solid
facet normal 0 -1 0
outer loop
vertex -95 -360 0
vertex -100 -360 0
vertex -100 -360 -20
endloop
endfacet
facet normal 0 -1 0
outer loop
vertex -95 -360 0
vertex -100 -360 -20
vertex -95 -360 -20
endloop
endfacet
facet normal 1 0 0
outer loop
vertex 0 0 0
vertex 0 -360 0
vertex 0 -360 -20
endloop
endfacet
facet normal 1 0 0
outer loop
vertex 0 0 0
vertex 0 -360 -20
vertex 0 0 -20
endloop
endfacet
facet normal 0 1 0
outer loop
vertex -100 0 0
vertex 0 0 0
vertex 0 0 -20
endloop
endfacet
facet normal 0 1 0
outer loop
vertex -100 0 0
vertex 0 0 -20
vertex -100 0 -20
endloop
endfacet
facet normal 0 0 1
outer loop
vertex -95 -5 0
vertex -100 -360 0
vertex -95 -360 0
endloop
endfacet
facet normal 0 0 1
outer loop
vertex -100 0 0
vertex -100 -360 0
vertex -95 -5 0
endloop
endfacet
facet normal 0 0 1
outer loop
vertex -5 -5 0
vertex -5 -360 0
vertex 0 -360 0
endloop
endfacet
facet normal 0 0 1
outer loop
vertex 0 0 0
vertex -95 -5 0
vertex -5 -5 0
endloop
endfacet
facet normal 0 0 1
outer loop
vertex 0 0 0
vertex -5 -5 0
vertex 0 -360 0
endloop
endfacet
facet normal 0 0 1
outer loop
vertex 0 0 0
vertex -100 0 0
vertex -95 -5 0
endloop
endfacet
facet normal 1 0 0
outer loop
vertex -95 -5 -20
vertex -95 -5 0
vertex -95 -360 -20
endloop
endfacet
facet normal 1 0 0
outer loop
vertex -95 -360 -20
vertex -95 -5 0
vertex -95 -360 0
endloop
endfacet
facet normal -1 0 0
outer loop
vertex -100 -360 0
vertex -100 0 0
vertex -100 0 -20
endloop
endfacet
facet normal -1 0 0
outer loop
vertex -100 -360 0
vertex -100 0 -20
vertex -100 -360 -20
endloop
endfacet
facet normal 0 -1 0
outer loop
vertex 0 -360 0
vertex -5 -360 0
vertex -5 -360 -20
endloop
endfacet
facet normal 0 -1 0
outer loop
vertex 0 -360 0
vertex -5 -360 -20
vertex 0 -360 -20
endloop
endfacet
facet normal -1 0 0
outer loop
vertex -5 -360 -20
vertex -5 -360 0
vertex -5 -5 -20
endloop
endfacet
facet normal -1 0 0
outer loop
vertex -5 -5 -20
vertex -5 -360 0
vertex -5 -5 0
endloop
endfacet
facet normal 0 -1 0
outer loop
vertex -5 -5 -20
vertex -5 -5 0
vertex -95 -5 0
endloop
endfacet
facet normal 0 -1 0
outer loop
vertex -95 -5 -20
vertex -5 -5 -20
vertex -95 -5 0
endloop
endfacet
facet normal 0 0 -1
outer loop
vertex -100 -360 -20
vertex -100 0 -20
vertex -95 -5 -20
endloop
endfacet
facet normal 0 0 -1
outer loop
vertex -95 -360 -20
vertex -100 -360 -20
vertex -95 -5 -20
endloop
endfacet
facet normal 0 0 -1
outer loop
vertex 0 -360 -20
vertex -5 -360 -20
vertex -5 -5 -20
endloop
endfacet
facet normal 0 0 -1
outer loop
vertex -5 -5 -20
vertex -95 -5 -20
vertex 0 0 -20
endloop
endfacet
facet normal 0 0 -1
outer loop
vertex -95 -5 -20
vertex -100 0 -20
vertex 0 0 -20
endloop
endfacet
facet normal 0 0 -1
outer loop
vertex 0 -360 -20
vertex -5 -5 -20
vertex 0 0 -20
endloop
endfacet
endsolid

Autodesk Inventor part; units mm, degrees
ref_plane "YZ Plane" through (0, 0, 0) normal (1, 0, 0) x (0, 1, 0)
ref_plane "XZ Plane" through (0, 0, 0) normal (0, 1, 0) x (-1, 0, 0)
sketch "スケッチ1" plane through (0, 0, 0) normal (0, 0, 1) x (1, 0, 0)
  line L0 (0, 0) -> (-100, 0)
  line L1 (-100, 0) -> (-100, -360)
  line L2 (-100, -360) -> (0, -360)
  line L3 (0, -360) -> (0, 0)
  dimension "d0" = 100
  dimension "d1" = 360
ref_plane "作業平面1" through (-6, -360, -20) normal (0, 0, -1) x (0, 1, 0)
extrude "押し出し1" add sketch "スケッチ1" against normal up to surface (20 mm away)
sketch "スケッチ3" plane through (0, 0, 0) normal (0, 0, 1) x (1, 0, 0)
  line L0 (0, -360) -> (0, 0) projected
  line L1 (0, 0) -> (-100, 0) projected
  line L2 (-100, 0) -> (-100, -360) projected
  line L3 (-100, -360) -> (0, -360) projected
  line L4 (-5, -5) -> (-95, -5)
  line L5 (-95, -5) -> (-95, -360)
  line L6 (-95, -360) -> (-5, -360)
  line L7 (-5, -360) -> (-5, -5)
  point P0 (-5, -360)
  dimension "d4" = 5
  dimension "d5" = 5
  dimension "d6" = 5
  dimension "d7" = 0
extrude "押し出し2" cut sketch "スケッチ3" against normal up to surface (20 mm away) contours L3 L5 L4 L7
properties part number "arm1"
